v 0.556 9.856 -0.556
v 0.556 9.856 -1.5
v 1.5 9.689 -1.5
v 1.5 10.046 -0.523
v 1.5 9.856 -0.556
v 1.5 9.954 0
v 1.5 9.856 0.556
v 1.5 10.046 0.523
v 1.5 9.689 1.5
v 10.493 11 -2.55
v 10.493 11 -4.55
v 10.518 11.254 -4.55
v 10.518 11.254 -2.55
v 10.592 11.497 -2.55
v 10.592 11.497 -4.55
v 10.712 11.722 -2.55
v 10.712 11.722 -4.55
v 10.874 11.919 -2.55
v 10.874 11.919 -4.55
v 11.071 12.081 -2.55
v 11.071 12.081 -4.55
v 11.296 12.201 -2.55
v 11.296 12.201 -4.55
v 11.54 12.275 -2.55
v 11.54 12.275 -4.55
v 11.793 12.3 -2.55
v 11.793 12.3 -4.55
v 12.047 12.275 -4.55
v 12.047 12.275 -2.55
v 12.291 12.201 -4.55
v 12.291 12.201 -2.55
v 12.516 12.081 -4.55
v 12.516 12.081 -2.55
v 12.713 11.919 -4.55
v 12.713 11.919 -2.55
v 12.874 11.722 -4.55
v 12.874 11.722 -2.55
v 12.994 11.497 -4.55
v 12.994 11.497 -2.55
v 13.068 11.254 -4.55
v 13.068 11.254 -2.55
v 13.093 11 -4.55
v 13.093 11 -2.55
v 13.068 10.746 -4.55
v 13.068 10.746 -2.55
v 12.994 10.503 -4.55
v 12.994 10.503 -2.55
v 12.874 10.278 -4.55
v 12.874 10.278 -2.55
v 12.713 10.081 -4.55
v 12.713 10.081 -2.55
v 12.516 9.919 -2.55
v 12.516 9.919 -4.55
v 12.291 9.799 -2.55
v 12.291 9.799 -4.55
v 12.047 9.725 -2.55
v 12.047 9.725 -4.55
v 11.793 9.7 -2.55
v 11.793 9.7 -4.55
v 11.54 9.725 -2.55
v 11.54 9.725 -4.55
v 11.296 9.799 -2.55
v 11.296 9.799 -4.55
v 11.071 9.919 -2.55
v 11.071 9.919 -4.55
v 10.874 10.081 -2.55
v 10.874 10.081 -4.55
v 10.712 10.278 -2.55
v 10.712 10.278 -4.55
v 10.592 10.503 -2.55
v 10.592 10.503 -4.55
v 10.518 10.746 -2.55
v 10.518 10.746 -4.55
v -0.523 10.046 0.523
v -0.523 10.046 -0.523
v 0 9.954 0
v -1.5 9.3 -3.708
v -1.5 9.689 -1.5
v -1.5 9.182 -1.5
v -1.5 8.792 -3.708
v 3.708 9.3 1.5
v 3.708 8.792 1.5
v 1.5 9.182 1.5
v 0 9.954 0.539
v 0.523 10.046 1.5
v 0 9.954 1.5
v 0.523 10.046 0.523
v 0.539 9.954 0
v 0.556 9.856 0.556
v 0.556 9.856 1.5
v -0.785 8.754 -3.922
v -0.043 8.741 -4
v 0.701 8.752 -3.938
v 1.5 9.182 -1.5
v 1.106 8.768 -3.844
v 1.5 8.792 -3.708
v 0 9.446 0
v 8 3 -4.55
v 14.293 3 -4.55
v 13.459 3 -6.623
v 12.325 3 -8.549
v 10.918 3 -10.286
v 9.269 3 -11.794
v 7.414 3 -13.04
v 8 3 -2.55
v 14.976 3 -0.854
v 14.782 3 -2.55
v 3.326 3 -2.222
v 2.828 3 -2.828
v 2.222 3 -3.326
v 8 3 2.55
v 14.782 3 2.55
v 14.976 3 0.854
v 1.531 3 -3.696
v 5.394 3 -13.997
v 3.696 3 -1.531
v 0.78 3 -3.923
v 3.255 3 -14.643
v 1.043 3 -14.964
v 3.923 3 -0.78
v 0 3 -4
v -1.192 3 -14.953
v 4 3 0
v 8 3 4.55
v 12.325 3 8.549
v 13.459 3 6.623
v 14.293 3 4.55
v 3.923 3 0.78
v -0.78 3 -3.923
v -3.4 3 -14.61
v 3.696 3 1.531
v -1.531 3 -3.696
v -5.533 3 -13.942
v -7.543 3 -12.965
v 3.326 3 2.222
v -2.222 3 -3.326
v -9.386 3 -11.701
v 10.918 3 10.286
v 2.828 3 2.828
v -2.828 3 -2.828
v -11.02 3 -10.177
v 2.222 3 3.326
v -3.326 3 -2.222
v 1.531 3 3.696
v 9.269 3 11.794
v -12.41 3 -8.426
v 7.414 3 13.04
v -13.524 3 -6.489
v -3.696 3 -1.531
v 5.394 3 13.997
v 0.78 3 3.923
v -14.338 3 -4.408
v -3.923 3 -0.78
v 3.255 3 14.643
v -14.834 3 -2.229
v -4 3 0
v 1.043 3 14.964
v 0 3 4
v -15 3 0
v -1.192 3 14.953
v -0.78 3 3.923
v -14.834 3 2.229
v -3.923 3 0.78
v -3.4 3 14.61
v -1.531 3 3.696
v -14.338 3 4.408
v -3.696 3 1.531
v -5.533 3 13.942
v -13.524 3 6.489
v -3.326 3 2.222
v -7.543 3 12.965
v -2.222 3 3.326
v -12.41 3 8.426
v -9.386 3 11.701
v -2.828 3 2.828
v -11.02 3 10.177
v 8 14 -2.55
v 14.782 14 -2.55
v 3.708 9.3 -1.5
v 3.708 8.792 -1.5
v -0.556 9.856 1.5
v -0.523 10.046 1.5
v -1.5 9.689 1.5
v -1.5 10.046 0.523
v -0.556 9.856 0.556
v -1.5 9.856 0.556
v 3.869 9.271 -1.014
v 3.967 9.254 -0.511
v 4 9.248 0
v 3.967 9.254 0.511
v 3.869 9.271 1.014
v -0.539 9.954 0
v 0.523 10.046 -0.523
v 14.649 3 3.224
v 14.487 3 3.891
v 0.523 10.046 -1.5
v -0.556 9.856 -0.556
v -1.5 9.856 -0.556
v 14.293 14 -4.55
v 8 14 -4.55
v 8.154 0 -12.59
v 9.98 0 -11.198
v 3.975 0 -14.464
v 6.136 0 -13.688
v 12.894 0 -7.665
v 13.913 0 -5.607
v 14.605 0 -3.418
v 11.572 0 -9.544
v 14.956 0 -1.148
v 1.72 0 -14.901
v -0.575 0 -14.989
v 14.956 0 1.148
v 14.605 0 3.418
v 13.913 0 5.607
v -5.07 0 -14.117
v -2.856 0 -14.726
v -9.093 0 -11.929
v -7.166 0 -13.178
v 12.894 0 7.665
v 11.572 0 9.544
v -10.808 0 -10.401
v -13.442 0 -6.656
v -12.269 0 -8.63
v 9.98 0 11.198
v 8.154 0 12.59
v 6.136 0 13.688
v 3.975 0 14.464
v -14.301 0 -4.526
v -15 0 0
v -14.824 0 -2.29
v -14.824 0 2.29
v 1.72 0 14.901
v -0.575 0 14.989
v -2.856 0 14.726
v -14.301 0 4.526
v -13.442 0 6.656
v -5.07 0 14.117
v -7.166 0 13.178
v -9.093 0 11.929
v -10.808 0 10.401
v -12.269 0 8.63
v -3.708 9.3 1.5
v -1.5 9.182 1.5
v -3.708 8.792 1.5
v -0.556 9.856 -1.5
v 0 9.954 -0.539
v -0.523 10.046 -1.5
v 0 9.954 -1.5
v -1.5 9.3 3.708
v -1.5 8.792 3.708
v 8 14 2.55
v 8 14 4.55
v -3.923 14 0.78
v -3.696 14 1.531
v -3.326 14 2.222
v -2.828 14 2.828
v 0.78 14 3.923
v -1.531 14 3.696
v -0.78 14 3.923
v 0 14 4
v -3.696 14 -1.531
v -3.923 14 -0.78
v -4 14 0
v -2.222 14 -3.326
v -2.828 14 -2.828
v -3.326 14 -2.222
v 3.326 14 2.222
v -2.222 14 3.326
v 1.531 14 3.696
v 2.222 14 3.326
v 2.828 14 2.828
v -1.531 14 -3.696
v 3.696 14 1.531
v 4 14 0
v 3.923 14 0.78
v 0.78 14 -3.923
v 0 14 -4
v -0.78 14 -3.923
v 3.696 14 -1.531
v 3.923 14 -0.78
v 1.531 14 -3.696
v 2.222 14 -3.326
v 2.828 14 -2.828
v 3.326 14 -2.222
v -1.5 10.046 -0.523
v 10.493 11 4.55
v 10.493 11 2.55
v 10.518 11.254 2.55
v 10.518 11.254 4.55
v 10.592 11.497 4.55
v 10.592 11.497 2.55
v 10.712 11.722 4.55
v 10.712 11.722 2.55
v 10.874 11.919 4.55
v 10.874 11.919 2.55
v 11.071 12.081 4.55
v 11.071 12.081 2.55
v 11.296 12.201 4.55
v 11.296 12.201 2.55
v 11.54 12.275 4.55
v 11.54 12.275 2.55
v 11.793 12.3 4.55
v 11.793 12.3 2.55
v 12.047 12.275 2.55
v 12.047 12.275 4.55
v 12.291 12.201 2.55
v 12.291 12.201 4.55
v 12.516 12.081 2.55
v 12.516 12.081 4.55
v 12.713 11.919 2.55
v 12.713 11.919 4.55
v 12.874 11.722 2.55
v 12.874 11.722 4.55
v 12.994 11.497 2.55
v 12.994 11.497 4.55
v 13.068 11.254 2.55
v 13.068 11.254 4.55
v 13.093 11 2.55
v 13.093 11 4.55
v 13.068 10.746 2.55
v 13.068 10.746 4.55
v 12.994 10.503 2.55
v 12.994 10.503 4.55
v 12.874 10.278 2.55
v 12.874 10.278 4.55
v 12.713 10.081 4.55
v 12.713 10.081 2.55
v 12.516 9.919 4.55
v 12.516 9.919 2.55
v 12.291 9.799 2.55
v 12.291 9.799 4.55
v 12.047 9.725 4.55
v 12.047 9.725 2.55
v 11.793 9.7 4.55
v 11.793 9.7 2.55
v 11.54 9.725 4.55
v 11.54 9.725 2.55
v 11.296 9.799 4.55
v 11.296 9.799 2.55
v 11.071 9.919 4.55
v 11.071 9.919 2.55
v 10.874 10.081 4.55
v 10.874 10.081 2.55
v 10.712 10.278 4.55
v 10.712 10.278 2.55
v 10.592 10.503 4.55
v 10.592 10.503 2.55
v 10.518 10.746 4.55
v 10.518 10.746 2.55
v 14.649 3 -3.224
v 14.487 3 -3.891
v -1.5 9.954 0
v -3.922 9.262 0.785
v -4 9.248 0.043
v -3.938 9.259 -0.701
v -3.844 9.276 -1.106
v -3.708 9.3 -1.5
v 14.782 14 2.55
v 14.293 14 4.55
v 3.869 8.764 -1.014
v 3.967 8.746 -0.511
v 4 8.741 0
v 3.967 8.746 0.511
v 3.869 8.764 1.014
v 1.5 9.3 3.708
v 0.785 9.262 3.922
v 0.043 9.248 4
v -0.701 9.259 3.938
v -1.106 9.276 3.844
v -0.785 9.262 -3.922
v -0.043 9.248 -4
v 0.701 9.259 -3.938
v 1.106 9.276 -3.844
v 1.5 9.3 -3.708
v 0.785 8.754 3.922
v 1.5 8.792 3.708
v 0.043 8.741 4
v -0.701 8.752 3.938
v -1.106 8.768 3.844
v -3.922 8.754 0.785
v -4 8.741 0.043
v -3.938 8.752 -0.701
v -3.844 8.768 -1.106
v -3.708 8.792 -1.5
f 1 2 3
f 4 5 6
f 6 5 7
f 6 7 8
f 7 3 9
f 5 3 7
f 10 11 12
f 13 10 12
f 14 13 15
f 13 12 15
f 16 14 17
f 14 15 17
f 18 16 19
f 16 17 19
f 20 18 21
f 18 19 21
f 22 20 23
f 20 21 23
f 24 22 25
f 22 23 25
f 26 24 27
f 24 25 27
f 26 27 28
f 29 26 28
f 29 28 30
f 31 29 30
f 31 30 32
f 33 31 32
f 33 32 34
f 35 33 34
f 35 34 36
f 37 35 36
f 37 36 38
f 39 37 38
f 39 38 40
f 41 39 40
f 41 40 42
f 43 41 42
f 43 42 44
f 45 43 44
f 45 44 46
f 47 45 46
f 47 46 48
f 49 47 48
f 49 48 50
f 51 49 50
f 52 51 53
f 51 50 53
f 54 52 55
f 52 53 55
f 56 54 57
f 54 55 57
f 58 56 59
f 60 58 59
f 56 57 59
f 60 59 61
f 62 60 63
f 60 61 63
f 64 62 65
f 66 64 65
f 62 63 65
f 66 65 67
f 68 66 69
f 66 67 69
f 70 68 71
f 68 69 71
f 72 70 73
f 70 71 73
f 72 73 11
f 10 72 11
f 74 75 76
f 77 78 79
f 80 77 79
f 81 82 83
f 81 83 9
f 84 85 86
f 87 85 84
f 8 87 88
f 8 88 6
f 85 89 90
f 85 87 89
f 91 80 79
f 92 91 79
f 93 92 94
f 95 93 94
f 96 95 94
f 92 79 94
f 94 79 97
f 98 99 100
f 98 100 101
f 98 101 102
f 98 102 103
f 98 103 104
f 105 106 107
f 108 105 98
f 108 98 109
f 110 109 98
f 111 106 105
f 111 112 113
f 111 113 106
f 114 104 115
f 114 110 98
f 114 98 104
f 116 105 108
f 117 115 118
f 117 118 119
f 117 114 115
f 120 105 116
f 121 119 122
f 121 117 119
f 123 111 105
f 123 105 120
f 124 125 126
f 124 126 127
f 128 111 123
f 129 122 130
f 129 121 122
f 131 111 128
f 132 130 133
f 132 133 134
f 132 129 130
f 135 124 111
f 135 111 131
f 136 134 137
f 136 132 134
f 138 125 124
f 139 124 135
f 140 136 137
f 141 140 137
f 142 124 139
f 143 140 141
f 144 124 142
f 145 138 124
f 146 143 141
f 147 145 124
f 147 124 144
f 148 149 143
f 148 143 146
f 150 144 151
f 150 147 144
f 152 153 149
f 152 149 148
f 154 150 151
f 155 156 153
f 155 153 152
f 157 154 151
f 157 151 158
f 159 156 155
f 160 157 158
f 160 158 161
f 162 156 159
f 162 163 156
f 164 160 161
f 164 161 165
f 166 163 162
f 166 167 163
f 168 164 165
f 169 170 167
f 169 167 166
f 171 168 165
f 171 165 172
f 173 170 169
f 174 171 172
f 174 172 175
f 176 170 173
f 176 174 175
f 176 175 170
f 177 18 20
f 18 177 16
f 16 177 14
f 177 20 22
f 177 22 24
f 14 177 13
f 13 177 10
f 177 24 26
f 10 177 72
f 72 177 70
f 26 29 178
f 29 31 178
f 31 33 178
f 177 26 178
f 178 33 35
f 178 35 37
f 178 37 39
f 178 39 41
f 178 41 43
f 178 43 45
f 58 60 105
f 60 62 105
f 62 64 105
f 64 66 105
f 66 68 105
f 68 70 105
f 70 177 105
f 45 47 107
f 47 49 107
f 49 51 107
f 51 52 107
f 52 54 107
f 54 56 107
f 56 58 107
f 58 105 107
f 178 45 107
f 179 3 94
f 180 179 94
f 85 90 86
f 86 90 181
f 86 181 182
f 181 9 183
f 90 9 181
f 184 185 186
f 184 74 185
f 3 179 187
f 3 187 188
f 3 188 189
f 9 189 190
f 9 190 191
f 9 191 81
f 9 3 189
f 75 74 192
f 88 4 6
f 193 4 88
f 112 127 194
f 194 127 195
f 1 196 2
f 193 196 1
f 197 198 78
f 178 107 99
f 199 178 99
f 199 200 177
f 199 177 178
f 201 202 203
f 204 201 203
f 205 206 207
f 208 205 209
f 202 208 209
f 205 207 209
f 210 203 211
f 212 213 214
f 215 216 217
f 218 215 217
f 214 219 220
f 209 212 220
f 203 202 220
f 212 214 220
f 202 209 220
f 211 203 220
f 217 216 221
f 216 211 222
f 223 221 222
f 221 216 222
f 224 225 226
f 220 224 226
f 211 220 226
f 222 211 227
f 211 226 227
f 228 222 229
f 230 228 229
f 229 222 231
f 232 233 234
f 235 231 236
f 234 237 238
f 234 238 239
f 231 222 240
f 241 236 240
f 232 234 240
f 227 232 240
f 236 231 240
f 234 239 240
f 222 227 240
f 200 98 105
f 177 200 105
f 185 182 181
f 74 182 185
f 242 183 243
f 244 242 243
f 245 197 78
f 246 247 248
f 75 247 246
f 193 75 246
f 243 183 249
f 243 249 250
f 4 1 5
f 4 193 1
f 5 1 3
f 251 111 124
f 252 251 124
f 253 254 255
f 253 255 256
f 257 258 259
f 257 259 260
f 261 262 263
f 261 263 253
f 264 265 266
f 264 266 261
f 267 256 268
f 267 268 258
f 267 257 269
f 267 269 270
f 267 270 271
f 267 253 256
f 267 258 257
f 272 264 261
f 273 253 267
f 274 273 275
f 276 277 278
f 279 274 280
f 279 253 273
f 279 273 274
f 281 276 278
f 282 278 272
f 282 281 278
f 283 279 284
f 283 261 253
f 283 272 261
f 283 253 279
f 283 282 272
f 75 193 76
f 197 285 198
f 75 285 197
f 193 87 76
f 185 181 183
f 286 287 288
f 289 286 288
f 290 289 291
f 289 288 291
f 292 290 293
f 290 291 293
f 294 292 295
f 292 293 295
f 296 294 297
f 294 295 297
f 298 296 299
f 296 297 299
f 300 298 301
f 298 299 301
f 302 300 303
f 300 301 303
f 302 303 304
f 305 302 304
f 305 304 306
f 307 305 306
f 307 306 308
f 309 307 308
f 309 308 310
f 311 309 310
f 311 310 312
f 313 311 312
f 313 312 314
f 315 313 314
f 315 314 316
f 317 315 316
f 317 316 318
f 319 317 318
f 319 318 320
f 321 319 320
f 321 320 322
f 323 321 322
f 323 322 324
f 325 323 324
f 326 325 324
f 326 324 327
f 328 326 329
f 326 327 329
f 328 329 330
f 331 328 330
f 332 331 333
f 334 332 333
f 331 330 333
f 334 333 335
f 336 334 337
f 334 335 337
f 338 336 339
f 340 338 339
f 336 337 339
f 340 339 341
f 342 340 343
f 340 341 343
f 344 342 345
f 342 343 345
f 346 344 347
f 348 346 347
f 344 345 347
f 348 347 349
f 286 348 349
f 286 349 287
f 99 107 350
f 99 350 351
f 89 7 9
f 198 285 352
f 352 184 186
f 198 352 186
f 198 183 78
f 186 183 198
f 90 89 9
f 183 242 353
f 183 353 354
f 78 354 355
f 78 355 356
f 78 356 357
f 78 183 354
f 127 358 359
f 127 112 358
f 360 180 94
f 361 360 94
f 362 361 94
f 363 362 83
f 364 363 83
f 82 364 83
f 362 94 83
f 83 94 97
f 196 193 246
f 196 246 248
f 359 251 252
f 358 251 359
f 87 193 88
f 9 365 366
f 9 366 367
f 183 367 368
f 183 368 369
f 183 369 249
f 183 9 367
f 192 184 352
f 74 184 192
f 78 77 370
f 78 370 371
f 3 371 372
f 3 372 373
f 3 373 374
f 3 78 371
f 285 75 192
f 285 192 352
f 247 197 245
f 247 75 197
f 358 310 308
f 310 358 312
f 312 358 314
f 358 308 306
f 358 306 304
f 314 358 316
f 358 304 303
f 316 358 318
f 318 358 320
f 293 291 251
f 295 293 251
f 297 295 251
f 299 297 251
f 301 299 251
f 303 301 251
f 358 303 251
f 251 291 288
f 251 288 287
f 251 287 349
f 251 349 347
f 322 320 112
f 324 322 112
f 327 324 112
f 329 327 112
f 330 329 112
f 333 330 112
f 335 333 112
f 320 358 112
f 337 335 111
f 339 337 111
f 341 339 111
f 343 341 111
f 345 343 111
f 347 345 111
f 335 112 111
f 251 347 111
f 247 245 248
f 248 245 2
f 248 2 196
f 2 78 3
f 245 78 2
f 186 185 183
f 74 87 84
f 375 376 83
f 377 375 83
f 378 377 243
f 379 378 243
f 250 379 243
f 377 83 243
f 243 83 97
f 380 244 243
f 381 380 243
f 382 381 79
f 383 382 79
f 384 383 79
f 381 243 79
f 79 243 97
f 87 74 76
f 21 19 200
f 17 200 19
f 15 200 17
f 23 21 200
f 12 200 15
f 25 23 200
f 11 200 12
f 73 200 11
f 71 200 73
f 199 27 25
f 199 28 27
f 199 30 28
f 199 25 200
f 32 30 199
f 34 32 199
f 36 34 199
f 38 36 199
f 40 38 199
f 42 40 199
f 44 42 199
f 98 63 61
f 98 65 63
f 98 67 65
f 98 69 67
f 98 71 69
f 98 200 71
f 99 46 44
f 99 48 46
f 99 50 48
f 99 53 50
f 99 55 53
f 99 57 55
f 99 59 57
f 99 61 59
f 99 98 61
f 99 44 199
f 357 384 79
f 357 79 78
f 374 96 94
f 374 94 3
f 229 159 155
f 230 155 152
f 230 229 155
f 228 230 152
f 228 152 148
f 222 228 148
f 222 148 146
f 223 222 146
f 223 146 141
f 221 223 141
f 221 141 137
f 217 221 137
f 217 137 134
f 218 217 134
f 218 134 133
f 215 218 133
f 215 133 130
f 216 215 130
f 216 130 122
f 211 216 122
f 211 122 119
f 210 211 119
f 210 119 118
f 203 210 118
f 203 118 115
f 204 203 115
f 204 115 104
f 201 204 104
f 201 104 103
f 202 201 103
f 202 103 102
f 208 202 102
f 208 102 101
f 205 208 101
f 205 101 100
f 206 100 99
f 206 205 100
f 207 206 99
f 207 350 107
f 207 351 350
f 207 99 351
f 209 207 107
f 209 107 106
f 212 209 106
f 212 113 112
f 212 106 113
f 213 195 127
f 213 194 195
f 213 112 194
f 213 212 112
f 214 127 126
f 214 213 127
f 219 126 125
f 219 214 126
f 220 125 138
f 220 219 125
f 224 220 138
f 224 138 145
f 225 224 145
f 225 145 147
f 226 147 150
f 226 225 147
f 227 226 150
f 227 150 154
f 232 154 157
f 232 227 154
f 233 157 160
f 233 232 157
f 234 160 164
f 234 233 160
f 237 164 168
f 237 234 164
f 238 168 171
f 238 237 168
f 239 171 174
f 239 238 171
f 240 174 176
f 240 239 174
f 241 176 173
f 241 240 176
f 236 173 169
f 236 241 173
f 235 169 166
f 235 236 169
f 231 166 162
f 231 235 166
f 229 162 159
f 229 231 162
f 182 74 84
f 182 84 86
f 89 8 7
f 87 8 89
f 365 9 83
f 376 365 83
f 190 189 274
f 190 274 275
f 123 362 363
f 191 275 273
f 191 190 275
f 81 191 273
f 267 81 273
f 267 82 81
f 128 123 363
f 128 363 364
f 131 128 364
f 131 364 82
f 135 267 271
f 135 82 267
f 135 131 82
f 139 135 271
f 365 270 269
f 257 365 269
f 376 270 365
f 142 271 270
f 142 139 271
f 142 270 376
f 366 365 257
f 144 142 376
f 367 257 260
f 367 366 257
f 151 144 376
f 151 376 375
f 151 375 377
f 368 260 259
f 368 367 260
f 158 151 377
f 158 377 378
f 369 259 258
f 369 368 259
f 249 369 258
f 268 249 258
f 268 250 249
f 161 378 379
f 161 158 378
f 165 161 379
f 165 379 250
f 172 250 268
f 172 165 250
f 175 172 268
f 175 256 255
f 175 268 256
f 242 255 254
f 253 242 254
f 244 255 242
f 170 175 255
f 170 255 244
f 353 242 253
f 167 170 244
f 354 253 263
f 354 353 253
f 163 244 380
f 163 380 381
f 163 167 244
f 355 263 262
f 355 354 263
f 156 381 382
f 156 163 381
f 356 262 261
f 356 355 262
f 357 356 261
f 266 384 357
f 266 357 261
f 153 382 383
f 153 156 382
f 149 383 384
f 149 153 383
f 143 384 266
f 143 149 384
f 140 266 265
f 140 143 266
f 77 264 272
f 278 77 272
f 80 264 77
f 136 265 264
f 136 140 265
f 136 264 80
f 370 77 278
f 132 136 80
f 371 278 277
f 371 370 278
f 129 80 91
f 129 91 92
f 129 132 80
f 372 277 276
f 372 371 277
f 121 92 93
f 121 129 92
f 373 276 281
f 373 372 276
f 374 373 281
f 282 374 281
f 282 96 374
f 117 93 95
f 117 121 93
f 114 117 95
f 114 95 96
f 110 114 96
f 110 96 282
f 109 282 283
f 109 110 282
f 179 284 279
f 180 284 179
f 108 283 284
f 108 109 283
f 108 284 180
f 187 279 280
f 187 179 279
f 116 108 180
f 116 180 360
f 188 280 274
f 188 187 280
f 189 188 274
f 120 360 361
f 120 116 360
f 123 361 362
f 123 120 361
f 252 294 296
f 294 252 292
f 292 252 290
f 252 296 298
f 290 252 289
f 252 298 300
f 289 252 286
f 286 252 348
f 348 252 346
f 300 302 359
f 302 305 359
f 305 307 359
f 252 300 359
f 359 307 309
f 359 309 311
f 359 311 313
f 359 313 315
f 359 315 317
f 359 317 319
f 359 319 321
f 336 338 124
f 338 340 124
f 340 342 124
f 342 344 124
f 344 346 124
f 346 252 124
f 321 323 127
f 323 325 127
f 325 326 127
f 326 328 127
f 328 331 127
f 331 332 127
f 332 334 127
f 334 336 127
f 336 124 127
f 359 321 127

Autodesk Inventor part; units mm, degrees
ref_plane "XZ Plane" through (0, 0, 0) normal (0, 1, 0) x (-1, 0, 0)
ref_plane "XY Plane" through (0, 0, 0) normal (0, 0, 1) x (1, 0, 0)
sketch "スケッチ1" plane through (0, 0, 0) normal (0, 1, 0) x (-1, 0, 0)
  circle A0 centre (0, 0) radius 15
  dimension "d0" = 30
extrude "押し出し1" add sketch "スケッチ1" along normal blind 3
sketch "スケッチ2" plane through (0, 3, 0) normal (0, 1, 0) x (1, 0, 0)
  circle A0 centre (0, 0) radius 15 projected
  line L0 (14.7817, -2.55) -> (8, -2.55)
  line L1 (8, -2.55) -> (8, -4.55)
  line L2 (8, 4.55) -> (8, 2.55)
  line L3 (-21, 0) -> (21, 0) projected
  line L4 (0, 21) -> (0, -21) projected
  line L5 (8, -4.55) -> (14.2933, -4.55)
  line L6 (14.7817, -2.55) -> (14.2933, -4.55)
  line L7 (8, 2.55) -> (14.7817, 2.55)
  line L8 (8, 2.55) -> (14.7817, 2.55) construction
  line L9 (8, 4.55) -> (14.2933, 4.55)
  line L10 (14.7817, 2.55) -> (14.2933, 4.55)
  point P0 (11.3908, -2.55)
  point P1 (8, -3.55)
  point P2 (8, 3.55)
  dimension "d16" = 2
  dimension "d27" = 8
  dimension "d28" = 2.55
  dimension "d29" = 8
  dimension "d31" = 2
  dimension "d33" = 2.55
extrude "押し出し2" add sketch "スケッチ2" along normal blind 11 contours L7 L2 L9 L10 | L6 L5 L1 L0
sketch "スケッチ4" plane through (14.2933, 3, -4.55) normal (0, 0, -1) x (-1, 0, 0)
  circle A0 centre (2.5, 8) radius 1.3
  line L0 (29.2933, 0) -> (0, 0) projected
  line L1 (6.2933, 0) -> (6.2933, 11) projected
  line L2 (0, 0) -> (0, 11) projected
  point P0 (14.2933, -3)
  dimension "d34" = 2.6
  dimension "d35" = 8
  dimension "d42" = 2.5
extrude "押し出し4" cut sketch "スケッチ4" against normal through all
sketch "スケッチ5" plane through (0, 3, 0) normal (0, 1, 0) x (1, 0, 0)
  circle A0 centre (0, 0) radius 4
  dimension "d39" = 8
extrude "押し出し5" add sketch "スケッチ5" along normal blind 11
sketch "スケッチ6" plane through (0, 0, 0) normal (1, 0, 0) x (0, 1, 0)
  line L0 (3, -4.55) -> (3, 4.55) projected
  line L1 (3, -2.55) -> (3, -4.55) projected
  line L2 (3, 2.55) -> (3, -2.55) projected
  line L3 (3, 4.55) -> (3, 2.55) projected
  line L4 (0, -15) -> (0, 15) projected
  line L5 (0, -15) -> (3, -15) projected
  point P0 (0, 0)
  point P1 (13, 0)
  dimension "d43" = 15
  dimension "d44" = 10
ref_plane "作業平面1" through (0, 13, 0) normal (0, -0.1736, 0.9848) x (1, 0, 0)
sketch "スケッチ7" plane through (0, 13, 0) normal (0, -0.1736, 0.9848) x (1, 0, 0)
  line L0 (1.5, -3) -> (-1.5, -3)
  line L1 (1.5, -3) -> (1.5, -3.5)
  line L2 (1.5, -3.5) -> (-1.5, -3.5)
  line L3 (-1.5, -3.5) -> (-1.5, -3)
  line L4 (0, -19.2066) -> (0, 7.3889) projected
  line L5 (-21, 0) -> (21, 0) projected
  point P0 (0, -12.8025)
  point P1 (1.5, -3.25)
  dimension "d46" = 3
  dimension "d47" = 0.5
  dimension "d48" = 1.5
  dimension "d49" = 3
extrude "押し出し6" cut sketch "スケッチ7" along normal blind 10
pattern_circular "円形状パターン1" count 4 over 360 about axis through (0, 3, 0) along (0, 1, 0) of "押し出し6"
properties part number "exp_latch_base_rev0"
